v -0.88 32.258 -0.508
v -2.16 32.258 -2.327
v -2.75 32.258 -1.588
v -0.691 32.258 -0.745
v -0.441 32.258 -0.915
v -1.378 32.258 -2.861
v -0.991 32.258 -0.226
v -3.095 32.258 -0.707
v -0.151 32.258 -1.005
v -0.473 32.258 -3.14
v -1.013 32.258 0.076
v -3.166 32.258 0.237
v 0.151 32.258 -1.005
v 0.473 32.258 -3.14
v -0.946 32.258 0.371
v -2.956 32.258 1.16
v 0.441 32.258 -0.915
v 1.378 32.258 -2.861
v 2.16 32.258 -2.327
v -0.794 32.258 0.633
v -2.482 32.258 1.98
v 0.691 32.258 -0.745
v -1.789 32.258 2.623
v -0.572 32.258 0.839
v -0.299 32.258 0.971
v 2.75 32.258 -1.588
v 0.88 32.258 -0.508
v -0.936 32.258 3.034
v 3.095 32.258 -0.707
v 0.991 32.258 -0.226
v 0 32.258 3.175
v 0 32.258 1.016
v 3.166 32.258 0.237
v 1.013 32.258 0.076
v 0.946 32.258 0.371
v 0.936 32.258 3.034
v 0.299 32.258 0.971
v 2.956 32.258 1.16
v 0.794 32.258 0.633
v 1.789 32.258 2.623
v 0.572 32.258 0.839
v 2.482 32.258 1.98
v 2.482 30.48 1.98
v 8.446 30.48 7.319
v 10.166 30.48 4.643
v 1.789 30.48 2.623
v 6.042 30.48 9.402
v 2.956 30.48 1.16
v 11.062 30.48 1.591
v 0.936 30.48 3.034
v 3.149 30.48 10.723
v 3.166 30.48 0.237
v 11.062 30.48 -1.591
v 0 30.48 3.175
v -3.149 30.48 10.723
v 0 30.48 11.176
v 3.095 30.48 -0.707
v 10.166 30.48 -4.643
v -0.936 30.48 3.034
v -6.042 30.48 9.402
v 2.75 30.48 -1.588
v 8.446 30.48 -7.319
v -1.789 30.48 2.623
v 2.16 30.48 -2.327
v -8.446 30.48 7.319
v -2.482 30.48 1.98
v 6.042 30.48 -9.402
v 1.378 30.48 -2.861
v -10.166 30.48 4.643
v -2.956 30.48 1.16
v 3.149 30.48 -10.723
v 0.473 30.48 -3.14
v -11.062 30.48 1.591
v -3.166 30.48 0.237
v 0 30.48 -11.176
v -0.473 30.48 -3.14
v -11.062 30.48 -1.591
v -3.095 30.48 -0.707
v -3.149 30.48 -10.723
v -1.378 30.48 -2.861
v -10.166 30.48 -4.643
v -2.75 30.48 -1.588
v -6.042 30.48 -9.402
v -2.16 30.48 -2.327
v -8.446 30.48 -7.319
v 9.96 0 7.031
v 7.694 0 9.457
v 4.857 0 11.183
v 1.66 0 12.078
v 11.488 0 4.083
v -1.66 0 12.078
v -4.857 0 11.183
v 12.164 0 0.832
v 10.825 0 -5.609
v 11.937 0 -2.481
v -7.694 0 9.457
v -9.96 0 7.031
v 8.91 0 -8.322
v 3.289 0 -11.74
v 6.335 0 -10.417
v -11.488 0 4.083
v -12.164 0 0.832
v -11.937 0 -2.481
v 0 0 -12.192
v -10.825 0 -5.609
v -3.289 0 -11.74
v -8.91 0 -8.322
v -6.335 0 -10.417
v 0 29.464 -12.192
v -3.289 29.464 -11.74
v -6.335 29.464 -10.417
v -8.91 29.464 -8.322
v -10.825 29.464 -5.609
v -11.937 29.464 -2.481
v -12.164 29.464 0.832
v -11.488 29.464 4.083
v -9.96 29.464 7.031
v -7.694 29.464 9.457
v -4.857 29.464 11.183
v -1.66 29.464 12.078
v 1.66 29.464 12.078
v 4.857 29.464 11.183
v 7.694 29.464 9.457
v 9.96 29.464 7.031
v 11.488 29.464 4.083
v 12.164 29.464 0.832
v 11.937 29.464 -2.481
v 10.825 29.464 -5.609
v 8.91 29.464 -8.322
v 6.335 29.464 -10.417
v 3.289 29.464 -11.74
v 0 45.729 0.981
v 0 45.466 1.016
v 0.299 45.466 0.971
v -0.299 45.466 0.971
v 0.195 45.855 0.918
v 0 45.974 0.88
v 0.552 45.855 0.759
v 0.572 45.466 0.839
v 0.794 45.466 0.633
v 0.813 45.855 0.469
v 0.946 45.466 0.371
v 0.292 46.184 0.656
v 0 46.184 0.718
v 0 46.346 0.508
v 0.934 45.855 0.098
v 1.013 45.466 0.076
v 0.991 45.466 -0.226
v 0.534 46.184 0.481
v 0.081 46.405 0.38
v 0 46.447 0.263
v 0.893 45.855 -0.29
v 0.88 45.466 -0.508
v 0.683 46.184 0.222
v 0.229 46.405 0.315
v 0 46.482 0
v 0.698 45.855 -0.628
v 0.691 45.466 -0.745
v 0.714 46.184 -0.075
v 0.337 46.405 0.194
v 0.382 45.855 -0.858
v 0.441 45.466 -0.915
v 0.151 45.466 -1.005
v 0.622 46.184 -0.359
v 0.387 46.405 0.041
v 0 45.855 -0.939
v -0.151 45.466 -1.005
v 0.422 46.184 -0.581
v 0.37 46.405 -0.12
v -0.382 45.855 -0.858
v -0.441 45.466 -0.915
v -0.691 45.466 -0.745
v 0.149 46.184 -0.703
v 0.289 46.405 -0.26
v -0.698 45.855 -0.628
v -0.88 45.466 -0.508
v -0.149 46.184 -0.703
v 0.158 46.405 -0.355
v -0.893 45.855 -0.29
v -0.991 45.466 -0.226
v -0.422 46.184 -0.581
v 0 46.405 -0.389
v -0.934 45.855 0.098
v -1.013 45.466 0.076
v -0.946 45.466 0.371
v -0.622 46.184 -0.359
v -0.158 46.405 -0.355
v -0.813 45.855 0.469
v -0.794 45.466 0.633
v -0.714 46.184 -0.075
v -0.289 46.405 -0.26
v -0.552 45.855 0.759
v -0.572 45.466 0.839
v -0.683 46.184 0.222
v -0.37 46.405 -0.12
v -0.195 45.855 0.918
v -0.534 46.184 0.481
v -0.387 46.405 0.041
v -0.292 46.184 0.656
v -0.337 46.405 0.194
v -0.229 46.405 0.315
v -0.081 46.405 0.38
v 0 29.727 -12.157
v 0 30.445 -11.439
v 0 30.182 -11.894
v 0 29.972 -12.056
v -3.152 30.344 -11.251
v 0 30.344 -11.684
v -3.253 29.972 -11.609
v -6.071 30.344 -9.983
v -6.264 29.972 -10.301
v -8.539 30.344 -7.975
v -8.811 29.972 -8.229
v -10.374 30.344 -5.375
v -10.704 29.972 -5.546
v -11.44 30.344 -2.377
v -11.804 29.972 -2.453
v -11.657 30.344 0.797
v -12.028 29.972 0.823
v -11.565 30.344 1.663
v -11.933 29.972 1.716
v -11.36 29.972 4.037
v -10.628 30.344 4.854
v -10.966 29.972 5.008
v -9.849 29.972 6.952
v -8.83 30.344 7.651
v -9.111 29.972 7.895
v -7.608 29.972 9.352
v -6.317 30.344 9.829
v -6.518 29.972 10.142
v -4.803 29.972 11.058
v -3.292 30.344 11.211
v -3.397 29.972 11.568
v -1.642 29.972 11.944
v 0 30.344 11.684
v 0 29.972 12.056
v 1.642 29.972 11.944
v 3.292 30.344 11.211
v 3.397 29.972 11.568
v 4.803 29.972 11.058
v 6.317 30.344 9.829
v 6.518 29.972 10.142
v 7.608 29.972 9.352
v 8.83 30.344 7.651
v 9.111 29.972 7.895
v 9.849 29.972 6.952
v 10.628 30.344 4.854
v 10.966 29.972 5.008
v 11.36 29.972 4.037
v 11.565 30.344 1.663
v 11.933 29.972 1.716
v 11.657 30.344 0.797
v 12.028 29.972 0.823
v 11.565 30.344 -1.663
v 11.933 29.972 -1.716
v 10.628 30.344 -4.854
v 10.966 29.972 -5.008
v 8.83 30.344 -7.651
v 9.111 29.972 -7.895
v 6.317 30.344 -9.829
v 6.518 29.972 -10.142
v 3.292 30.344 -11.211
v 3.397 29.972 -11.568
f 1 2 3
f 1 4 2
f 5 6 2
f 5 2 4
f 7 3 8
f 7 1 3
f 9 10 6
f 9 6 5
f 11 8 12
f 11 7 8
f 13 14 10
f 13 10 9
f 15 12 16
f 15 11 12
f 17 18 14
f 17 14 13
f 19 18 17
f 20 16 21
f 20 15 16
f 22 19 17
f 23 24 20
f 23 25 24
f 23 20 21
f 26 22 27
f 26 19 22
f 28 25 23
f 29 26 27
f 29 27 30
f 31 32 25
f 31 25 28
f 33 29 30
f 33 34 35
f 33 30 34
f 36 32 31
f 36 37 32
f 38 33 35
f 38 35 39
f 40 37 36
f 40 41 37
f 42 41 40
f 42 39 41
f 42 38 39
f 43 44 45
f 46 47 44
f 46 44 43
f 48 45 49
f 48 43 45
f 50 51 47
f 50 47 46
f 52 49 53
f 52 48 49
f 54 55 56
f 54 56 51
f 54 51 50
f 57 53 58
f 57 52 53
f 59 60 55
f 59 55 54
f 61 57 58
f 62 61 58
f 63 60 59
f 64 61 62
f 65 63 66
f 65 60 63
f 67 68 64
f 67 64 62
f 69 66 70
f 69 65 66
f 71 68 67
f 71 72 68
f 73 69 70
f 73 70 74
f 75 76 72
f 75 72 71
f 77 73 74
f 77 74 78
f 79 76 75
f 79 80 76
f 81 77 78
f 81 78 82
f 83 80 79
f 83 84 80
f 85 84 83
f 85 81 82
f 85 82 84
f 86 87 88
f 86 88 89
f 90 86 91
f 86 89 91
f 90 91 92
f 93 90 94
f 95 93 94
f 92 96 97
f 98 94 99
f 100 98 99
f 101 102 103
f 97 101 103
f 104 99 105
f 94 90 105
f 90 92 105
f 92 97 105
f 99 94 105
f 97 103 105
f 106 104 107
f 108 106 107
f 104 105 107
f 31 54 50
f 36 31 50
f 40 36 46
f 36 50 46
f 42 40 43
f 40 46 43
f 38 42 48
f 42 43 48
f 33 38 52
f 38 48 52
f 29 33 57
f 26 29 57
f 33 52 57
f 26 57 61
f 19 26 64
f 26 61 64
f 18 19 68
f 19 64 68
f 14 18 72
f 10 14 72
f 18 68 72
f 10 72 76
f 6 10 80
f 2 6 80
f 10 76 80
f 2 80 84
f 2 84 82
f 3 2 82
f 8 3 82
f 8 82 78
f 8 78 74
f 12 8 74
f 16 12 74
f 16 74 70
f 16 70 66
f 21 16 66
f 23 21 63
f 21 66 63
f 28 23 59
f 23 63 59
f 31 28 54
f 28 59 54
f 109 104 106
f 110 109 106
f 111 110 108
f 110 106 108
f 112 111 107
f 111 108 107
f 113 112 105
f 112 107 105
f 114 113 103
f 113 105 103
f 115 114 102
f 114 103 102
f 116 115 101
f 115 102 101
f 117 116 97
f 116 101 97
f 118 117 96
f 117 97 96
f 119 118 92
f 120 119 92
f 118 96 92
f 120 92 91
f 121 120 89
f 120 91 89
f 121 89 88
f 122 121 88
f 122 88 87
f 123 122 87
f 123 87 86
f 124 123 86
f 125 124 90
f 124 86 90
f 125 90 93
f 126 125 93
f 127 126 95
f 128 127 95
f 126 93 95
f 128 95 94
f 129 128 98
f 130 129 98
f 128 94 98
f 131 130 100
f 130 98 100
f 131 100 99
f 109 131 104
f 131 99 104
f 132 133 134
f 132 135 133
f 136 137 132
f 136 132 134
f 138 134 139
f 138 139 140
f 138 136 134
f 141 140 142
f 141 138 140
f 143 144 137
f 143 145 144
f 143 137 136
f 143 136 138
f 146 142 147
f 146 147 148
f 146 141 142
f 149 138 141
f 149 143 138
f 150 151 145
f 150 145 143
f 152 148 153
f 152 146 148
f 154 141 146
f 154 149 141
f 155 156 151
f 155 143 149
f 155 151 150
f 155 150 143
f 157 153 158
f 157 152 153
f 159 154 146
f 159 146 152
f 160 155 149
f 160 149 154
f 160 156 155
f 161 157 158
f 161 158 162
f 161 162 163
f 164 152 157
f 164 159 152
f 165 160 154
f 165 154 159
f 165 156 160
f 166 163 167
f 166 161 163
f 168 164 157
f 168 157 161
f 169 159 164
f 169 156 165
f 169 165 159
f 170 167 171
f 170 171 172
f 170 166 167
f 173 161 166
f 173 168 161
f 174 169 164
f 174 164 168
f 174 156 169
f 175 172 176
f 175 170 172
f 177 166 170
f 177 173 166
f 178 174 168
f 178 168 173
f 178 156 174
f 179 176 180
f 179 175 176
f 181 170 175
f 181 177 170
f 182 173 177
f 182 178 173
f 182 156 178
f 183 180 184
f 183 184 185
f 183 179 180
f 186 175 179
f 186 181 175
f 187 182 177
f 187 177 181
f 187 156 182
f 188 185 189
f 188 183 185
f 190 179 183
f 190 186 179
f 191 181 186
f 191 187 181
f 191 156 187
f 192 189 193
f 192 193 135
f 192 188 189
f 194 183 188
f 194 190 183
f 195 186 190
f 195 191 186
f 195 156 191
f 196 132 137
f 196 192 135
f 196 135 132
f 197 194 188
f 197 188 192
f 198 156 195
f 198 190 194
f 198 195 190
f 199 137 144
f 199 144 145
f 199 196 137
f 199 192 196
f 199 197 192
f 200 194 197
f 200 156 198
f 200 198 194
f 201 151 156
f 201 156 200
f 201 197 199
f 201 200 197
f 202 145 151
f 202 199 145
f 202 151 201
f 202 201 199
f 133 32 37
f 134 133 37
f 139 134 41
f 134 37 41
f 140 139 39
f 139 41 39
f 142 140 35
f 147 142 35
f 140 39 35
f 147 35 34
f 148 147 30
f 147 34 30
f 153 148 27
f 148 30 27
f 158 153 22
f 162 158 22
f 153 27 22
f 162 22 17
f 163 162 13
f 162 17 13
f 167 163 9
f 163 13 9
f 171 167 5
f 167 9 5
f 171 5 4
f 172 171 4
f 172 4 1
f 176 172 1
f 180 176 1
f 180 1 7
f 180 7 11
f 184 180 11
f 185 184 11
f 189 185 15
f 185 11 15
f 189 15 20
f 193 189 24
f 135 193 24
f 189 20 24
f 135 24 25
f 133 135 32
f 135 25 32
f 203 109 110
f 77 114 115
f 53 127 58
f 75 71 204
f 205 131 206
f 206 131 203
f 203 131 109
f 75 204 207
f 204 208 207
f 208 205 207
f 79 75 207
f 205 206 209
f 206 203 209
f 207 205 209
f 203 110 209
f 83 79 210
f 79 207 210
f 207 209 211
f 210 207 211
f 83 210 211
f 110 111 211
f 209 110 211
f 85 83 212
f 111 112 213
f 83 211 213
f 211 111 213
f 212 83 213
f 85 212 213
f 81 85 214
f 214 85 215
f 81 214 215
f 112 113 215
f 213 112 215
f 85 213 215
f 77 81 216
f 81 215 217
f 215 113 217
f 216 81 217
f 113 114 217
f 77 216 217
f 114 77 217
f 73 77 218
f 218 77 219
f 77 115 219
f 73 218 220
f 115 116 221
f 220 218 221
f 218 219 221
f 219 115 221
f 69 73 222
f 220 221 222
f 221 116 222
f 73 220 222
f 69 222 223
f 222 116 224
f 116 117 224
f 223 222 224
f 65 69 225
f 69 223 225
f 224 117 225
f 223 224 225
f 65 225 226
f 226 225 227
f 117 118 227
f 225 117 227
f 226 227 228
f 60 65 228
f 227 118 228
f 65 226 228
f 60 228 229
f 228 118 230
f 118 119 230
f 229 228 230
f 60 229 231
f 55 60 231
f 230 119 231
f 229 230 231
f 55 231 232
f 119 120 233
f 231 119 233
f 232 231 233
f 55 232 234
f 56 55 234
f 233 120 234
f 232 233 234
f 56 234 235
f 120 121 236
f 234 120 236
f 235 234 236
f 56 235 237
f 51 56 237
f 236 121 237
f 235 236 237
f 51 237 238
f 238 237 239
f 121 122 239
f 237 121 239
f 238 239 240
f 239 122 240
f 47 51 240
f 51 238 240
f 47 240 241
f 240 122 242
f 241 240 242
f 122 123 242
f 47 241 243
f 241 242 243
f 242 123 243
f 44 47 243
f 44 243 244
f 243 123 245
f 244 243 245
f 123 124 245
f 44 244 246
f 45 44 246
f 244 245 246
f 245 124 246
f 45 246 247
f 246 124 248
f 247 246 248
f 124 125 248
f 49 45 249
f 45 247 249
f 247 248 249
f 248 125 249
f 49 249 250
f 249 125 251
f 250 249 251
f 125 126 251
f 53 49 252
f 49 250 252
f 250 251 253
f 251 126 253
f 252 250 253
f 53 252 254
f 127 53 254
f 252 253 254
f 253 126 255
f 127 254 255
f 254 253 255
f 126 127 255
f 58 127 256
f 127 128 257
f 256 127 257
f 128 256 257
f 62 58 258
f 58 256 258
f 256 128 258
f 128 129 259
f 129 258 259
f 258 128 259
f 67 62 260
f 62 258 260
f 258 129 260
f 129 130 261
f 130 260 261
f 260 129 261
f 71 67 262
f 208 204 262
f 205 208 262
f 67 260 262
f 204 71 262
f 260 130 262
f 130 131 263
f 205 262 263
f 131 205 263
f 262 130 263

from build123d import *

# Parameters (mm, degrees)
SKETCH1_R           = 12.192
BOSS_EXTRUDE1_DEPTH = 30.48
SKETCH2_R           = 3.175
BOSS_EXTRUDE2_DEPTH = 1.778
SKETCH3_R           = 1.016
BOSS_EXTRUDE3_DEPTH = 14.224
FILLET1_R           = 1.016
FILLET2_R           = 1.016


with BuildPart() as part:
    # Sketch1 → Boss-Extrude1 (new body)
    with BuildSketch(Plane(origin=(0, 0, 0), x_dir=(1, 0, 0), z_dir=(0, 1, 0))):
        with Locations(Location((0, 0, 0), (0, 0, 90))):
            Circle(SKETCH1_R)
    extrude(amount=BOSS_EXTRUDE1_DEPTH)

    # Sketch2 → Boss-Extrude2 (add)
    with BuildSketch(Plane(origin=(0, 30.48, 0), x_dir=(1, 0, 0), z_dir=(0, 1, 0))):
        with Locations(Location((0, 0, 0), (0, 0, 270))):
            Circle(SKETCH2_R)
    extrude(amount=BOSS_EXTRUDE2_DEPTH)

    # Sketch3 → Boss-Extrude3 (add)
    with BuildSketch(Plane(origin=(0, 32.258, 0), x_dir=(1, 0, 0), z_dir=(0, 1, 0))):
        with Locations(Location((0, 0, 0), (0, 0, 270))):
            Circle(SKETCH3_R)
    extrude(amount=BOSS_EXTRUDE3_DEPTH)

    # Fillet1
    fillet1_edges = [part.edges().sort_by_distance(p)[0] for p in [
        (0, 46.482, -1.016),
    ]]
    fillet(fillet1_edges, radius=FILLET1_R)

    # Fillet2
    fillet2_edges = [part.edges().sort_by_distance(p)[0] for p in [
        (0, 30.48, 12.192),
    ]]
    fillet(fillet2_edges, radius=FILLET2_R)


solid = part.part
